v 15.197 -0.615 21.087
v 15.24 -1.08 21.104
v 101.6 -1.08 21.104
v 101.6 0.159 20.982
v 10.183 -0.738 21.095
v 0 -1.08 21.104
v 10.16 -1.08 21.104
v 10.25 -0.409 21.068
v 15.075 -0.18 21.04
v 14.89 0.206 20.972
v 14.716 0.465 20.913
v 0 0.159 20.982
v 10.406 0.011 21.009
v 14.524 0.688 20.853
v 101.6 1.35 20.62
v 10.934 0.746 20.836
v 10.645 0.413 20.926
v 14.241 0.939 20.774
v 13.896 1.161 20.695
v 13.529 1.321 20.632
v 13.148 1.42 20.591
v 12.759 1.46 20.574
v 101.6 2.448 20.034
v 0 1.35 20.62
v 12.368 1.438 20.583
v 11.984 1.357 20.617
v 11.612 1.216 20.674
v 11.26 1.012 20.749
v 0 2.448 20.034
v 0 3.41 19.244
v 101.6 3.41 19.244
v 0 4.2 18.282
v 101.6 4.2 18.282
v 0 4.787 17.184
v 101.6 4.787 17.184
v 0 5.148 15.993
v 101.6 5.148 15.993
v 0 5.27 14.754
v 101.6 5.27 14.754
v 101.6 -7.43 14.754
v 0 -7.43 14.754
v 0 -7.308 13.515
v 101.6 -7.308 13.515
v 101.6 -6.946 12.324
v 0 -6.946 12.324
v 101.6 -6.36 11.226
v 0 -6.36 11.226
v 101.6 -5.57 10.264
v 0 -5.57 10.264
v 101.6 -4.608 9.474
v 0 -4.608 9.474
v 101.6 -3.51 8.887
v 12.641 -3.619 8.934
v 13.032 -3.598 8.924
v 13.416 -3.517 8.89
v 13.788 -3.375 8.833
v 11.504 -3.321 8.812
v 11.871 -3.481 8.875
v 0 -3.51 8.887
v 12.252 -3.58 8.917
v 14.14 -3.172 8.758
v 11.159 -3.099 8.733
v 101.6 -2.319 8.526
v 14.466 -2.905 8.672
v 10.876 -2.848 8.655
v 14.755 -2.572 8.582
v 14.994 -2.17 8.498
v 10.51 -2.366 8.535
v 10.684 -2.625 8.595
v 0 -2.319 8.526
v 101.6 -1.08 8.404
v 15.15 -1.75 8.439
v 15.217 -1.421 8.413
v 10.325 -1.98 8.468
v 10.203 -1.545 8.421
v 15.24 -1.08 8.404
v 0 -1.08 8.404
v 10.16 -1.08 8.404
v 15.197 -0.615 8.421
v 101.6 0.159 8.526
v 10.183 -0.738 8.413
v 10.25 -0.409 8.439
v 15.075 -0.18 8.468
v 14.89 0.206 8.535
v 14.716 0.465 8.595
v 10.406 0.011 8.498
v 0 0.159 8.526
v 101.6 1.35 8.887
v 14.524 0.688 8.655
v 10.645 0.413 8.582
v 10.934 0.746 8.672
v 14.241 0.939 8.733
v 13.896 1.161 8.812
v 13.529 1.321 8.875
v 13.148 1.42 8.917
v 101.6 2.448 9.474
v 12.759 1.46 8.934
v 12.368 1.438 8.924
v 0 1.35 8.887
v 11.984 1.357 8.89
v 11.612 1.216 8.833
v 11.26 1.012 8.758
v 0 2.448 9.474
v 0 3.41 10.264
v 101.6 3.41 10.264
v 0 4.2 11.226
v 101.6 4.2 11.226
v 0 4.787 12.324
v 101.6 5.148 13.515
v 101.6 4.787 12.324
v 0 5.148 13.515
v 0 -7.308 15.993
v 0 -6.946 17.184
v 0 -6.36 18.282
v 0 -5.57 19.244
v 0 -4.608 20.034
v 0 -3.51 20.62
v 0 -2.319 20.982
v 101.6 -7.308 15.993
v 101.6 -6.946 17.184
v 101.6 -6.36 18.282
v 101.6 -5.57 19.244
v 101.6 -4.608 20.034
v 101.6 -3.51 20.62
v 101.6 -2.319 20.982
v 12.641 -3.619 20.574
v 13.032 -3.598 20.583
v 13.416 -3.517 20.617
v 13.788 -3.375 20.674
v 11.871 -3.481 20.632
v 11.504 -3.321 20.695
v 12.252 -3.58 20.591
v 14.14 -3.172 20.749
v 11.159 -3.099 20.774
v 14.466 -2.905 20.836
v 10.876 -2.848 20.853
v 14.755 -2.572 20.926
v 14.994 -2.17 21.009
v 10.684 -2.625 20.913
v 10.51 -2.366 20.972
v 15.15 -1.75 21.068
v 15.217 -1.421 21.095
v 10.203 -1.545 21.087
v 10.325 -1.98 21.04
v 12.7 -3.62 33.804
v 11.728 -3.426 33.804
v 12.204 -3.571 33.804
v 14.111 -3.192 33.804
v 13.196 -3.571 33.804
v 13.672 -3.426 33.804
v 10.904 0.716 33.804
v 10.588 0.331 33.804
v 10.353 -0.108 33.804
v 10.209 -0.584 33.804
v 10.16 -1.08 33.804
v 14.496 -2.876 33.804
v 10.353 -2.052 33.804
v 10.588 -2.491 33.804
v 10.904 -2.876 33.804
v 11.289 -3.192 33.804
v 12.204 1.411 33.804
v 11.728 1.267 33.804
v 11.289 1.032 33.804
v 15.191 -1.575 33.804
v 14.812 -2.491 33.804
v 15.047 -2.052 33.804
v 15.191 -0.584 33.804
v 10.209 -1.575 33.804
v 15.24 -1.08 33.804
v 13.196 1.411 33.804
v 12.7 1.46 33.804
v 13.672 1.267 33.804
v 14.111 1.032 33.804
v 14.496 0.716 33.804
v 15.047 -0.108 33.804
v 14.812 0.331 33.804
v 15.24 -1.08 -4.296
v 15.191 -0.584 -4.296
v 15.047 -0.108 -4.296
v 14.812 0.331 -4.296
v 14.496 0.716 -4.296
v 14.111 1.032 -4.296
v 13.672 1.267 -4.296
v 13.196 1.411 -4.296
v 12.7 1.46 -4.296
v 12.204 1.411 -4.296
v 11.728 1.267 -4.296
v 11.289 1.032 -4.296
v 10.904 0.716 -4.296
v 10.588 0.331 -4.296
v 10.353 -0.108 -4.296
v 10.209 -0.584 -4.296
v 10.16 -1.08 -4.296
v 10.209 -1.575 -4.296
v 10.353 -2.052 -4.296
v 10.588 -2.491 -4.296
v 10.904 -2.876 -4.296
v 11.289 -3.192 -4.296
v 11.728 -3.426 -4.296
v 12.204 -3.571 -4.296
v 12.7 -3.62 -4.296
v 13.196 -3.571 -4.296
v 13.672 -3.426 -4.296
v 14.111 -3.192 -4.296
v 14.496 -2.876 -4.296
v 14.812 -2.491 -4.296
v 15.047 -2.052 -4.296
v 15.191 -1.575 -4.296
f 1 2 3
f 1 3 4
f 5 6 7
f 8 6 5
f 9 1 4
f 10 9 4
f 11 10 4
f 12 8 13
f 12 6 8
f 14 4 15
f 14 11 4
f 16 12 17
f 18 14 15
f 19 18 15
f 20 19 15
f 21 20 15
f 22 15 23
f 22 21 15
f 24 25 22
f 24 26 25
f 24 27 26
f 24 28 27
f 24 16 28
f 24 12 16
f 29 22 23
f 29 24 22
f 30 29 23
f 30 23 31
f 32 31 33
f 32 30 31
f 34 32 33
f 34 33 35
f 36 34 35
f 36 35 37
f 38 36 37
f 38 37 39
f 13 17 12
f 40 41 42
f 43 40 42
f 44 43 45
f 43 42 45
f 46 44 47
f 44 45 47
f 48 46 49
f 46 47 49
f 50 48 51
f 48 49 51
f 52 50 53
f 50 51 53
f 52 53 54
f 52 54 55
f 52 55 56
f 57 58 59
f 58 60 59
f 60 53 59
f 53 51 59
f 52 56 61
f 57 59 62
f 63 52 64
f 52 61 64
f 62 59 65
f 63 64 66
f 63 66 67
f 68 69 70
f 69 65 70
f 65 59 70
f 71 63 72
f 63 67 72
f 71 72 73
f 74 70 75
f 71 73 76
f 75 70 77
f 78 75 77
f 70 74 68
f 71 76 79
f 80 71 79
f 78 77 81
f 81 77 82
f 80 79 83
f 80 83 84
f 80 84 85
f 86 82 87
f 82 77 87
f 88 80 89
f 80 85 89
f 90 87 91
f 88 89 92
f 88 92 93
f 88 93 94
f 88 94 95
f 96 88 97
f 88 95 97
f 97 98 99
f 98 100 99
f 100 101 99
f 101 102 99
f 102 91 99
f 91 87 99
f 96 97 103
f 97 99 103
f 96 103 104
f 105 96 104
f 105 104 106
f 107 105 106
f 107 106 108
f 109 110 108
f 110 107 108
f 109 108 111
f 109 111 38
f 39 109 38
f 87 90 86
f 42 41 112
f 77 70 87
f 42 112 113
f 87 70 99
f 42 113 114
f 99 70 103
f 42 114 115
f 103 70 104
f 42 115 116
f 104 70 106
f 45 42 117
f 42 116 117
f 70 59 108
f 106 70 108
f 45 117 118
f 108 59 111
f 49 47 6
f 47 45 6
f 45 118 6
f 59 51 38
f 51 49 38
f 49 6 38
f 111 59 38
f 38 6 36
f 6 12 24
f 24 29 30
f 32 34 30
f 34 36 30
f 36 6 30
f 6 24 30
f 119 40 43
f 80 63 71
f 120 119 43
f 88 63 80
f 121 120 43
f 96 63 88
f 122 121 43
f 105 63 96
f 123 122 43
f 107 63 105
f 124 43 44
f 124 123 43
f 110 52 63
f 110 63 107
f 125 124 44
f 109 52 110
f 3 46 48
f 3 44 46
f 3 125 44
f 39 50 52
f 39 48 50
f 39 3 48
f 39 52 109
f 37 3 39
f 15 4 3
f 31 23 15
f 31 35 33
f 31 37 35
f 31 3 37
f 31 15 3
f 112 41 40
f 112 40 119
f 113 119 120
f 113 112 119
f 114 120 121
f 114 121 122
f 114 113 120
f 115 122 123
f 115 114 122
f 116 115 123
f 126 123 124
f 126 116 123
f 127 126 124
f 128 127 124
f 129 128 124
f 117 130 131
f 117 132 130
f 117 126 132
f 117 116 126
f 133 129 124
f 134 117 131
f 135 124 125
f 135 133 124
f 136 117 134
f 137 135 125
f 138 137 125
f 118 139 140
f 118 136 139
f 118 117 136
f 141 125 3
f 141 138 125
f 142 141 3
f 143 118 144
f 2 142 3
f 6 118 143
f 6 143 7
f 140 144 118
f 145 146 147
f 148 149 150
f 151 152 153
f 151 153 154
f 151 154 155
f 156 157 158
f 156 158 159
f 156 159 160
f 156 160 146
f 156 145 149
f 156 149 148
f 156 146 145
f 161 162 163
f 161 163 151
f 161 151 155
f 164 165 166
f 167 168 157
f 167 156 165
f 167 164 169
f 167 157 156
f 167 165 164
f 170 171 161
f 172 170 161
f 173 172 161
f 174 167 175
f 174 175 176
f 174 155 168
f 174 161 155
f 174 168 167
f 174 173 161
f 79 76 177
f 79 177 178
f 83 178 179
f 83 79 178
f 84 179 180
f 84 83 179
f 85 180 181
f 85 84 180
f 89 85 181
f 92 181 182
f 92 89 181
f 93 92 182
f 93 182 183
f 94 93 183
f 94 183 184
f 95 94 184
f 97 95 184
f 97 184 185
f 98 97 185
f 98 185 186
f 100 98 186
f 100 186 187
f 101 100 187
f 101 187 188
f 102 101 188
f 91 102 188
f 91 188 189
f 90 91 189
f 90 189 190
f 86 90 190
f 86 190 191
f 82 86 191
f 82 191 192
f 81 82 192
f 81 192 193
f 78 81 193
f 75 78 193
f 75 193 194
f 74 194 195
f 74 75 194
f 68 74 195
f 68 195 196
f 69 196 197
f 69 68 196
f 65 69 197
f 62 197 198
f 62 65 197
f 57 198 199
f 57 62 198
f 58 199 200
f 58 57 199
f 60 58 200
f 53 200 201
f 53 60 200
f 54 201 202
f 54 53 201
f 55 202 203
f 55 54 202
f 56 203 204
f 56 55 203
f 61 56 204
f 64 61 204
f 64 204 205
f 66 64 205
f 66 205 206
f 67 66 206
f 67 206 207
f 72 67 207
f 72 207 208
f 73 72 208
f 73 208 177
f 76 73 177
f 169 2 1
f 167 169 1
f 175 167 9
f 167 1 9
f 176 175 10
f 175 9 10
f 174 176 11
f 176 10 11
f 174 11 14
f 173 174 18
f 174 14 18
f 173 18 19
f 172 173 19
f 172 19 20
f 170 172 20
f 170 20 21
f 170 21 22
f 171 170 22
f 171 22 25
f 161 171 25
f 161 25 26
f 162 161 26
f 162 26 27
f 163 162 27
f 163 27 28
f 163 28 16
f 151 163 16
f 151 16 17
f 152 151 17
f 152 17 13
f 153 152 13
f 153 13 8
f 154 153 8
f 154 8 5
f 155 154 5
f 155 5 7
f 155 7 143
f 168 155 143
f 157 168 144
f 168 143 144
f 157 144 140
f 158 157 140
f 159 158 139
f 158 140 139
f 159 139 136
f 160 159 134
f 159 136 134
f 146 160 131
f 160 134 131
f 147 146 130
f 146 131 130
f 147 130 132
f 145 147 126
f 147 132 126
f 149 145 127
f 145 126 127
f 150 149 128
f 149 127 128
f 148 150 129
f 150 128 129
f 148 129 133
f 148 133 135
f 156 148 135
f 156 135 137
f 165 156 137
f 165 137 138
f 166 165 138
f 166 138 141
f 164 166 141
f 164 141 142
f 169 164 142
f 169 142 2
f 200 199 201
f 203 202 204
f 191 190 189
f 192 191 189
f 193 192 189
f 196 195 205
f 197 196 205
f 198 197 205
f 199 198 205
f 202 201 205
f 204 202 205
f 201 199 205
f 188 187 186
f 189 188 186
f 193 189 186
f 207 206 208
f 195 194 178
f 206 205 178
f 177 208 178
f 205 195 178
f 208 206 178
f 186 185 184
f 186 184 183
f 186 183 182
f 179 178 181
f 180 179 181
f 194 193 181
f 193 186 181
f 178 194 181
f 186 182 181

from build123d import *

# Parameters (mm, degrees)
F0_W         = 12.7
F0_H         = 12.7
F1_DEPTH     = 101.6
F2_R         = 2.54
F3_DEPTH     = 25.4
F4_DEPTH     = 12.7
F5_T4_DEPTH  = 133.35
F5_S5_R      = 2.54
F5_T6_DEPTH  = 68
F5_T10_DEPTH = 133.35
F5_S11_R     = 2.54
F5_T12_DEPTH = 68
F5_T16_DEPTH = 133.35
F5_S17_R     = 2.54
F5_T18_DEPTH = 68
F5_T22_DEPTH = 133.35
F5_S23_R     = 2.54
F5_T24_DEPTH = 68


# Not quite as in the source:
# - a fillet or chamfer that OpenCascade refuses, or shapes differently, is made with other operations: its cross-section is extruded or revolved along the edge and cut away or added


with BuildPart() as f1:
    # F0 (on Right) → F1 (new body)
    with BuildSketch(Plane.YZ):
        with Locations((-1.0797850298, 14.7537575103)):
            Rectangle(F0_W, F0_H)
    extrude(amount=F1_DEPTH)

    # F2 (on face) → F3 (join)
    with BuildSketch(Plane.XY.offset(21.1037575103)):
        with Locations((12.7, -1.0797850298)):
            Circle(F2_R)
    extrude(amount=-F3_DEPTH)

    # F2 (on face) → F4 (join)
    with BuildSketch(Plane.XY.offset(21.1037575103)):
        with Locations((12.7, -1.0797850298)):
            Circle(F2_R)
    extrude(amount=F4_DEPTH)

    # F5: fillet of radius 6.35 on 4 edges, made by hand


with BuildPart() as f5_tool2:
    # F5_s3 → F5_t4 (new body)
    with BuildSketch(Plane.YZ.offset(-15.875)):
        with BuildLine():
            ThreePointArc((-7.4297850298, 14.7537575103), (-5.5699130903, 19.2438855709), (-1.0797850298, 21.1037575103))
            Line((-1.0797850298, 21.1037575103), (-7.4297850298, 21.1037575103))
            Line((-7.4297850298, 21.1037575103), (-7.4297850298, 14.7537575103))
        make_face()
    extrude(amount=F5_T4_DEPTH)

    # F5_s5 → F5_t6 (cut, symmetric)
    with BuildSketch(Plane.XY.offset(17.9)):
        with Locations((12.7, -1.0797850298)):
            Circle(F5_S5_R)
    extrude(amount=F5_T6_DEPTH, both=True, mode=Mode.SUBTRACT)


with BuildPart() as f1_1:
    add(f1.part)

    # F5_t1: cut F5_tool2
    add(f5_tool2.part, mode=Mode.SUBTRACT)


with BuildPart() as f5_tool8:
    # F5_s9 → F5_t10 (new body)
    with BuildSketch(Plane.YZ.offset(-15.875)):
        with BuildLine():
            ThreePointArc((-1.0797850298, 21.1037575103), (3.4103430308, 19.2438855709), (5.2702149702, 14.7537575103))
            Line((5.2702149702, 14.7537575103), (5.2702149702, 21.1037575103))
            Line((5.2702149702, 21.1037575103), (-1.0797850298, 21.1037575103))
        make_face()
    extrude(amount=F5_T10_DEPTH)

    # F5_s11 → F5_t12 (cut, symmetric)
    with BuildSketch(Plane.XY.offset(17.9)):
        with Locations((12.7, -1.0797850298)):
            Circle(F5_S11_R)
    extrude(amount=F5_T12_DEPTH, both=True, mode=Mode.SUBTRACT)


with BuildPart() as f1_2:
    add(f1_1.part)

    # F5_t7: cut F5_tool8
    add(f5_tool8.part, mode=Mode.SUBTRACT)


with BuildPart() as f5_tool14:
    # F5_s15 → F5_t16 (new body)
    with BuildSketch(Plane.YZ.offset(-15.875)):
        with BuildLine():
            ThreePointArc((-7.4297850298, 14.7537575103), (-5.5699130903, 10.2636294498), (-1.0797850298, 8.4037575103))
            Line((-1.0797850298, 8.4037575103), (-7.4297850298, 8.4037575103))
            Line((-7.4297850298, 8.4037575103), (-7.4297850298, 14.7537575103))
        make_face()
    extrude(amount=F5_T16_DEPTH)

    # F5_s17 → F5_t18 (cut, symmetric)
    with BuildSketch(Plane.XY.offset(11.6)):
        with Locations((12.7, -1.0797850298)):
            Circle(F5_S17_R)
    extrude(amount=F5_T18_DEPTH, both=True, mode=Mode.SUBTRACT)


with BuildPart() as f1_3:
    add(f1_2.part)

    # F5_t13: cut F5_tool14
    add(f5_tool14.part, mode=Mode.SUBTRACT)


with BuildPart() as f5_tool20:
    # F5_s21 → F5_t22 (new body)
    with BuildSketch(Plane.YZ.offset(-15.875)):
        with BuildLine():
            ThreePointArc((-1.0797850298, 8.4037575103), (3.4103430308, 10.2636294498), (5.2702149702, 14.7537575103))
            Line((5.2702149702, 14.7537575103), (5.2702149702, 8.4037575103))
            Line((5.2702149702, 8.4037575103), (-1.0797850298, 8.4037575103))
        make_face()
    extrude(amount=F5_T22_DEPTH)

    # F5_s23 → F5_t24 (cut, symmetric)
    with BuildSketch(Plane.XY.offset(11.6)):
        with Locations((12.7, -1.0797850298)):
            Circle(F5_S23_R)
    extrude(amount=F5_T24_DEPTH, both=True, mode=Mode.SUBTRACT)


with BuildPart() as f1_4:
    add(f1_3.part)

    # F5_t19: cut F5_tool20
    add(f5_tool20.part, mode=Mode.SUBTRACT)


solid = f1_4.part
